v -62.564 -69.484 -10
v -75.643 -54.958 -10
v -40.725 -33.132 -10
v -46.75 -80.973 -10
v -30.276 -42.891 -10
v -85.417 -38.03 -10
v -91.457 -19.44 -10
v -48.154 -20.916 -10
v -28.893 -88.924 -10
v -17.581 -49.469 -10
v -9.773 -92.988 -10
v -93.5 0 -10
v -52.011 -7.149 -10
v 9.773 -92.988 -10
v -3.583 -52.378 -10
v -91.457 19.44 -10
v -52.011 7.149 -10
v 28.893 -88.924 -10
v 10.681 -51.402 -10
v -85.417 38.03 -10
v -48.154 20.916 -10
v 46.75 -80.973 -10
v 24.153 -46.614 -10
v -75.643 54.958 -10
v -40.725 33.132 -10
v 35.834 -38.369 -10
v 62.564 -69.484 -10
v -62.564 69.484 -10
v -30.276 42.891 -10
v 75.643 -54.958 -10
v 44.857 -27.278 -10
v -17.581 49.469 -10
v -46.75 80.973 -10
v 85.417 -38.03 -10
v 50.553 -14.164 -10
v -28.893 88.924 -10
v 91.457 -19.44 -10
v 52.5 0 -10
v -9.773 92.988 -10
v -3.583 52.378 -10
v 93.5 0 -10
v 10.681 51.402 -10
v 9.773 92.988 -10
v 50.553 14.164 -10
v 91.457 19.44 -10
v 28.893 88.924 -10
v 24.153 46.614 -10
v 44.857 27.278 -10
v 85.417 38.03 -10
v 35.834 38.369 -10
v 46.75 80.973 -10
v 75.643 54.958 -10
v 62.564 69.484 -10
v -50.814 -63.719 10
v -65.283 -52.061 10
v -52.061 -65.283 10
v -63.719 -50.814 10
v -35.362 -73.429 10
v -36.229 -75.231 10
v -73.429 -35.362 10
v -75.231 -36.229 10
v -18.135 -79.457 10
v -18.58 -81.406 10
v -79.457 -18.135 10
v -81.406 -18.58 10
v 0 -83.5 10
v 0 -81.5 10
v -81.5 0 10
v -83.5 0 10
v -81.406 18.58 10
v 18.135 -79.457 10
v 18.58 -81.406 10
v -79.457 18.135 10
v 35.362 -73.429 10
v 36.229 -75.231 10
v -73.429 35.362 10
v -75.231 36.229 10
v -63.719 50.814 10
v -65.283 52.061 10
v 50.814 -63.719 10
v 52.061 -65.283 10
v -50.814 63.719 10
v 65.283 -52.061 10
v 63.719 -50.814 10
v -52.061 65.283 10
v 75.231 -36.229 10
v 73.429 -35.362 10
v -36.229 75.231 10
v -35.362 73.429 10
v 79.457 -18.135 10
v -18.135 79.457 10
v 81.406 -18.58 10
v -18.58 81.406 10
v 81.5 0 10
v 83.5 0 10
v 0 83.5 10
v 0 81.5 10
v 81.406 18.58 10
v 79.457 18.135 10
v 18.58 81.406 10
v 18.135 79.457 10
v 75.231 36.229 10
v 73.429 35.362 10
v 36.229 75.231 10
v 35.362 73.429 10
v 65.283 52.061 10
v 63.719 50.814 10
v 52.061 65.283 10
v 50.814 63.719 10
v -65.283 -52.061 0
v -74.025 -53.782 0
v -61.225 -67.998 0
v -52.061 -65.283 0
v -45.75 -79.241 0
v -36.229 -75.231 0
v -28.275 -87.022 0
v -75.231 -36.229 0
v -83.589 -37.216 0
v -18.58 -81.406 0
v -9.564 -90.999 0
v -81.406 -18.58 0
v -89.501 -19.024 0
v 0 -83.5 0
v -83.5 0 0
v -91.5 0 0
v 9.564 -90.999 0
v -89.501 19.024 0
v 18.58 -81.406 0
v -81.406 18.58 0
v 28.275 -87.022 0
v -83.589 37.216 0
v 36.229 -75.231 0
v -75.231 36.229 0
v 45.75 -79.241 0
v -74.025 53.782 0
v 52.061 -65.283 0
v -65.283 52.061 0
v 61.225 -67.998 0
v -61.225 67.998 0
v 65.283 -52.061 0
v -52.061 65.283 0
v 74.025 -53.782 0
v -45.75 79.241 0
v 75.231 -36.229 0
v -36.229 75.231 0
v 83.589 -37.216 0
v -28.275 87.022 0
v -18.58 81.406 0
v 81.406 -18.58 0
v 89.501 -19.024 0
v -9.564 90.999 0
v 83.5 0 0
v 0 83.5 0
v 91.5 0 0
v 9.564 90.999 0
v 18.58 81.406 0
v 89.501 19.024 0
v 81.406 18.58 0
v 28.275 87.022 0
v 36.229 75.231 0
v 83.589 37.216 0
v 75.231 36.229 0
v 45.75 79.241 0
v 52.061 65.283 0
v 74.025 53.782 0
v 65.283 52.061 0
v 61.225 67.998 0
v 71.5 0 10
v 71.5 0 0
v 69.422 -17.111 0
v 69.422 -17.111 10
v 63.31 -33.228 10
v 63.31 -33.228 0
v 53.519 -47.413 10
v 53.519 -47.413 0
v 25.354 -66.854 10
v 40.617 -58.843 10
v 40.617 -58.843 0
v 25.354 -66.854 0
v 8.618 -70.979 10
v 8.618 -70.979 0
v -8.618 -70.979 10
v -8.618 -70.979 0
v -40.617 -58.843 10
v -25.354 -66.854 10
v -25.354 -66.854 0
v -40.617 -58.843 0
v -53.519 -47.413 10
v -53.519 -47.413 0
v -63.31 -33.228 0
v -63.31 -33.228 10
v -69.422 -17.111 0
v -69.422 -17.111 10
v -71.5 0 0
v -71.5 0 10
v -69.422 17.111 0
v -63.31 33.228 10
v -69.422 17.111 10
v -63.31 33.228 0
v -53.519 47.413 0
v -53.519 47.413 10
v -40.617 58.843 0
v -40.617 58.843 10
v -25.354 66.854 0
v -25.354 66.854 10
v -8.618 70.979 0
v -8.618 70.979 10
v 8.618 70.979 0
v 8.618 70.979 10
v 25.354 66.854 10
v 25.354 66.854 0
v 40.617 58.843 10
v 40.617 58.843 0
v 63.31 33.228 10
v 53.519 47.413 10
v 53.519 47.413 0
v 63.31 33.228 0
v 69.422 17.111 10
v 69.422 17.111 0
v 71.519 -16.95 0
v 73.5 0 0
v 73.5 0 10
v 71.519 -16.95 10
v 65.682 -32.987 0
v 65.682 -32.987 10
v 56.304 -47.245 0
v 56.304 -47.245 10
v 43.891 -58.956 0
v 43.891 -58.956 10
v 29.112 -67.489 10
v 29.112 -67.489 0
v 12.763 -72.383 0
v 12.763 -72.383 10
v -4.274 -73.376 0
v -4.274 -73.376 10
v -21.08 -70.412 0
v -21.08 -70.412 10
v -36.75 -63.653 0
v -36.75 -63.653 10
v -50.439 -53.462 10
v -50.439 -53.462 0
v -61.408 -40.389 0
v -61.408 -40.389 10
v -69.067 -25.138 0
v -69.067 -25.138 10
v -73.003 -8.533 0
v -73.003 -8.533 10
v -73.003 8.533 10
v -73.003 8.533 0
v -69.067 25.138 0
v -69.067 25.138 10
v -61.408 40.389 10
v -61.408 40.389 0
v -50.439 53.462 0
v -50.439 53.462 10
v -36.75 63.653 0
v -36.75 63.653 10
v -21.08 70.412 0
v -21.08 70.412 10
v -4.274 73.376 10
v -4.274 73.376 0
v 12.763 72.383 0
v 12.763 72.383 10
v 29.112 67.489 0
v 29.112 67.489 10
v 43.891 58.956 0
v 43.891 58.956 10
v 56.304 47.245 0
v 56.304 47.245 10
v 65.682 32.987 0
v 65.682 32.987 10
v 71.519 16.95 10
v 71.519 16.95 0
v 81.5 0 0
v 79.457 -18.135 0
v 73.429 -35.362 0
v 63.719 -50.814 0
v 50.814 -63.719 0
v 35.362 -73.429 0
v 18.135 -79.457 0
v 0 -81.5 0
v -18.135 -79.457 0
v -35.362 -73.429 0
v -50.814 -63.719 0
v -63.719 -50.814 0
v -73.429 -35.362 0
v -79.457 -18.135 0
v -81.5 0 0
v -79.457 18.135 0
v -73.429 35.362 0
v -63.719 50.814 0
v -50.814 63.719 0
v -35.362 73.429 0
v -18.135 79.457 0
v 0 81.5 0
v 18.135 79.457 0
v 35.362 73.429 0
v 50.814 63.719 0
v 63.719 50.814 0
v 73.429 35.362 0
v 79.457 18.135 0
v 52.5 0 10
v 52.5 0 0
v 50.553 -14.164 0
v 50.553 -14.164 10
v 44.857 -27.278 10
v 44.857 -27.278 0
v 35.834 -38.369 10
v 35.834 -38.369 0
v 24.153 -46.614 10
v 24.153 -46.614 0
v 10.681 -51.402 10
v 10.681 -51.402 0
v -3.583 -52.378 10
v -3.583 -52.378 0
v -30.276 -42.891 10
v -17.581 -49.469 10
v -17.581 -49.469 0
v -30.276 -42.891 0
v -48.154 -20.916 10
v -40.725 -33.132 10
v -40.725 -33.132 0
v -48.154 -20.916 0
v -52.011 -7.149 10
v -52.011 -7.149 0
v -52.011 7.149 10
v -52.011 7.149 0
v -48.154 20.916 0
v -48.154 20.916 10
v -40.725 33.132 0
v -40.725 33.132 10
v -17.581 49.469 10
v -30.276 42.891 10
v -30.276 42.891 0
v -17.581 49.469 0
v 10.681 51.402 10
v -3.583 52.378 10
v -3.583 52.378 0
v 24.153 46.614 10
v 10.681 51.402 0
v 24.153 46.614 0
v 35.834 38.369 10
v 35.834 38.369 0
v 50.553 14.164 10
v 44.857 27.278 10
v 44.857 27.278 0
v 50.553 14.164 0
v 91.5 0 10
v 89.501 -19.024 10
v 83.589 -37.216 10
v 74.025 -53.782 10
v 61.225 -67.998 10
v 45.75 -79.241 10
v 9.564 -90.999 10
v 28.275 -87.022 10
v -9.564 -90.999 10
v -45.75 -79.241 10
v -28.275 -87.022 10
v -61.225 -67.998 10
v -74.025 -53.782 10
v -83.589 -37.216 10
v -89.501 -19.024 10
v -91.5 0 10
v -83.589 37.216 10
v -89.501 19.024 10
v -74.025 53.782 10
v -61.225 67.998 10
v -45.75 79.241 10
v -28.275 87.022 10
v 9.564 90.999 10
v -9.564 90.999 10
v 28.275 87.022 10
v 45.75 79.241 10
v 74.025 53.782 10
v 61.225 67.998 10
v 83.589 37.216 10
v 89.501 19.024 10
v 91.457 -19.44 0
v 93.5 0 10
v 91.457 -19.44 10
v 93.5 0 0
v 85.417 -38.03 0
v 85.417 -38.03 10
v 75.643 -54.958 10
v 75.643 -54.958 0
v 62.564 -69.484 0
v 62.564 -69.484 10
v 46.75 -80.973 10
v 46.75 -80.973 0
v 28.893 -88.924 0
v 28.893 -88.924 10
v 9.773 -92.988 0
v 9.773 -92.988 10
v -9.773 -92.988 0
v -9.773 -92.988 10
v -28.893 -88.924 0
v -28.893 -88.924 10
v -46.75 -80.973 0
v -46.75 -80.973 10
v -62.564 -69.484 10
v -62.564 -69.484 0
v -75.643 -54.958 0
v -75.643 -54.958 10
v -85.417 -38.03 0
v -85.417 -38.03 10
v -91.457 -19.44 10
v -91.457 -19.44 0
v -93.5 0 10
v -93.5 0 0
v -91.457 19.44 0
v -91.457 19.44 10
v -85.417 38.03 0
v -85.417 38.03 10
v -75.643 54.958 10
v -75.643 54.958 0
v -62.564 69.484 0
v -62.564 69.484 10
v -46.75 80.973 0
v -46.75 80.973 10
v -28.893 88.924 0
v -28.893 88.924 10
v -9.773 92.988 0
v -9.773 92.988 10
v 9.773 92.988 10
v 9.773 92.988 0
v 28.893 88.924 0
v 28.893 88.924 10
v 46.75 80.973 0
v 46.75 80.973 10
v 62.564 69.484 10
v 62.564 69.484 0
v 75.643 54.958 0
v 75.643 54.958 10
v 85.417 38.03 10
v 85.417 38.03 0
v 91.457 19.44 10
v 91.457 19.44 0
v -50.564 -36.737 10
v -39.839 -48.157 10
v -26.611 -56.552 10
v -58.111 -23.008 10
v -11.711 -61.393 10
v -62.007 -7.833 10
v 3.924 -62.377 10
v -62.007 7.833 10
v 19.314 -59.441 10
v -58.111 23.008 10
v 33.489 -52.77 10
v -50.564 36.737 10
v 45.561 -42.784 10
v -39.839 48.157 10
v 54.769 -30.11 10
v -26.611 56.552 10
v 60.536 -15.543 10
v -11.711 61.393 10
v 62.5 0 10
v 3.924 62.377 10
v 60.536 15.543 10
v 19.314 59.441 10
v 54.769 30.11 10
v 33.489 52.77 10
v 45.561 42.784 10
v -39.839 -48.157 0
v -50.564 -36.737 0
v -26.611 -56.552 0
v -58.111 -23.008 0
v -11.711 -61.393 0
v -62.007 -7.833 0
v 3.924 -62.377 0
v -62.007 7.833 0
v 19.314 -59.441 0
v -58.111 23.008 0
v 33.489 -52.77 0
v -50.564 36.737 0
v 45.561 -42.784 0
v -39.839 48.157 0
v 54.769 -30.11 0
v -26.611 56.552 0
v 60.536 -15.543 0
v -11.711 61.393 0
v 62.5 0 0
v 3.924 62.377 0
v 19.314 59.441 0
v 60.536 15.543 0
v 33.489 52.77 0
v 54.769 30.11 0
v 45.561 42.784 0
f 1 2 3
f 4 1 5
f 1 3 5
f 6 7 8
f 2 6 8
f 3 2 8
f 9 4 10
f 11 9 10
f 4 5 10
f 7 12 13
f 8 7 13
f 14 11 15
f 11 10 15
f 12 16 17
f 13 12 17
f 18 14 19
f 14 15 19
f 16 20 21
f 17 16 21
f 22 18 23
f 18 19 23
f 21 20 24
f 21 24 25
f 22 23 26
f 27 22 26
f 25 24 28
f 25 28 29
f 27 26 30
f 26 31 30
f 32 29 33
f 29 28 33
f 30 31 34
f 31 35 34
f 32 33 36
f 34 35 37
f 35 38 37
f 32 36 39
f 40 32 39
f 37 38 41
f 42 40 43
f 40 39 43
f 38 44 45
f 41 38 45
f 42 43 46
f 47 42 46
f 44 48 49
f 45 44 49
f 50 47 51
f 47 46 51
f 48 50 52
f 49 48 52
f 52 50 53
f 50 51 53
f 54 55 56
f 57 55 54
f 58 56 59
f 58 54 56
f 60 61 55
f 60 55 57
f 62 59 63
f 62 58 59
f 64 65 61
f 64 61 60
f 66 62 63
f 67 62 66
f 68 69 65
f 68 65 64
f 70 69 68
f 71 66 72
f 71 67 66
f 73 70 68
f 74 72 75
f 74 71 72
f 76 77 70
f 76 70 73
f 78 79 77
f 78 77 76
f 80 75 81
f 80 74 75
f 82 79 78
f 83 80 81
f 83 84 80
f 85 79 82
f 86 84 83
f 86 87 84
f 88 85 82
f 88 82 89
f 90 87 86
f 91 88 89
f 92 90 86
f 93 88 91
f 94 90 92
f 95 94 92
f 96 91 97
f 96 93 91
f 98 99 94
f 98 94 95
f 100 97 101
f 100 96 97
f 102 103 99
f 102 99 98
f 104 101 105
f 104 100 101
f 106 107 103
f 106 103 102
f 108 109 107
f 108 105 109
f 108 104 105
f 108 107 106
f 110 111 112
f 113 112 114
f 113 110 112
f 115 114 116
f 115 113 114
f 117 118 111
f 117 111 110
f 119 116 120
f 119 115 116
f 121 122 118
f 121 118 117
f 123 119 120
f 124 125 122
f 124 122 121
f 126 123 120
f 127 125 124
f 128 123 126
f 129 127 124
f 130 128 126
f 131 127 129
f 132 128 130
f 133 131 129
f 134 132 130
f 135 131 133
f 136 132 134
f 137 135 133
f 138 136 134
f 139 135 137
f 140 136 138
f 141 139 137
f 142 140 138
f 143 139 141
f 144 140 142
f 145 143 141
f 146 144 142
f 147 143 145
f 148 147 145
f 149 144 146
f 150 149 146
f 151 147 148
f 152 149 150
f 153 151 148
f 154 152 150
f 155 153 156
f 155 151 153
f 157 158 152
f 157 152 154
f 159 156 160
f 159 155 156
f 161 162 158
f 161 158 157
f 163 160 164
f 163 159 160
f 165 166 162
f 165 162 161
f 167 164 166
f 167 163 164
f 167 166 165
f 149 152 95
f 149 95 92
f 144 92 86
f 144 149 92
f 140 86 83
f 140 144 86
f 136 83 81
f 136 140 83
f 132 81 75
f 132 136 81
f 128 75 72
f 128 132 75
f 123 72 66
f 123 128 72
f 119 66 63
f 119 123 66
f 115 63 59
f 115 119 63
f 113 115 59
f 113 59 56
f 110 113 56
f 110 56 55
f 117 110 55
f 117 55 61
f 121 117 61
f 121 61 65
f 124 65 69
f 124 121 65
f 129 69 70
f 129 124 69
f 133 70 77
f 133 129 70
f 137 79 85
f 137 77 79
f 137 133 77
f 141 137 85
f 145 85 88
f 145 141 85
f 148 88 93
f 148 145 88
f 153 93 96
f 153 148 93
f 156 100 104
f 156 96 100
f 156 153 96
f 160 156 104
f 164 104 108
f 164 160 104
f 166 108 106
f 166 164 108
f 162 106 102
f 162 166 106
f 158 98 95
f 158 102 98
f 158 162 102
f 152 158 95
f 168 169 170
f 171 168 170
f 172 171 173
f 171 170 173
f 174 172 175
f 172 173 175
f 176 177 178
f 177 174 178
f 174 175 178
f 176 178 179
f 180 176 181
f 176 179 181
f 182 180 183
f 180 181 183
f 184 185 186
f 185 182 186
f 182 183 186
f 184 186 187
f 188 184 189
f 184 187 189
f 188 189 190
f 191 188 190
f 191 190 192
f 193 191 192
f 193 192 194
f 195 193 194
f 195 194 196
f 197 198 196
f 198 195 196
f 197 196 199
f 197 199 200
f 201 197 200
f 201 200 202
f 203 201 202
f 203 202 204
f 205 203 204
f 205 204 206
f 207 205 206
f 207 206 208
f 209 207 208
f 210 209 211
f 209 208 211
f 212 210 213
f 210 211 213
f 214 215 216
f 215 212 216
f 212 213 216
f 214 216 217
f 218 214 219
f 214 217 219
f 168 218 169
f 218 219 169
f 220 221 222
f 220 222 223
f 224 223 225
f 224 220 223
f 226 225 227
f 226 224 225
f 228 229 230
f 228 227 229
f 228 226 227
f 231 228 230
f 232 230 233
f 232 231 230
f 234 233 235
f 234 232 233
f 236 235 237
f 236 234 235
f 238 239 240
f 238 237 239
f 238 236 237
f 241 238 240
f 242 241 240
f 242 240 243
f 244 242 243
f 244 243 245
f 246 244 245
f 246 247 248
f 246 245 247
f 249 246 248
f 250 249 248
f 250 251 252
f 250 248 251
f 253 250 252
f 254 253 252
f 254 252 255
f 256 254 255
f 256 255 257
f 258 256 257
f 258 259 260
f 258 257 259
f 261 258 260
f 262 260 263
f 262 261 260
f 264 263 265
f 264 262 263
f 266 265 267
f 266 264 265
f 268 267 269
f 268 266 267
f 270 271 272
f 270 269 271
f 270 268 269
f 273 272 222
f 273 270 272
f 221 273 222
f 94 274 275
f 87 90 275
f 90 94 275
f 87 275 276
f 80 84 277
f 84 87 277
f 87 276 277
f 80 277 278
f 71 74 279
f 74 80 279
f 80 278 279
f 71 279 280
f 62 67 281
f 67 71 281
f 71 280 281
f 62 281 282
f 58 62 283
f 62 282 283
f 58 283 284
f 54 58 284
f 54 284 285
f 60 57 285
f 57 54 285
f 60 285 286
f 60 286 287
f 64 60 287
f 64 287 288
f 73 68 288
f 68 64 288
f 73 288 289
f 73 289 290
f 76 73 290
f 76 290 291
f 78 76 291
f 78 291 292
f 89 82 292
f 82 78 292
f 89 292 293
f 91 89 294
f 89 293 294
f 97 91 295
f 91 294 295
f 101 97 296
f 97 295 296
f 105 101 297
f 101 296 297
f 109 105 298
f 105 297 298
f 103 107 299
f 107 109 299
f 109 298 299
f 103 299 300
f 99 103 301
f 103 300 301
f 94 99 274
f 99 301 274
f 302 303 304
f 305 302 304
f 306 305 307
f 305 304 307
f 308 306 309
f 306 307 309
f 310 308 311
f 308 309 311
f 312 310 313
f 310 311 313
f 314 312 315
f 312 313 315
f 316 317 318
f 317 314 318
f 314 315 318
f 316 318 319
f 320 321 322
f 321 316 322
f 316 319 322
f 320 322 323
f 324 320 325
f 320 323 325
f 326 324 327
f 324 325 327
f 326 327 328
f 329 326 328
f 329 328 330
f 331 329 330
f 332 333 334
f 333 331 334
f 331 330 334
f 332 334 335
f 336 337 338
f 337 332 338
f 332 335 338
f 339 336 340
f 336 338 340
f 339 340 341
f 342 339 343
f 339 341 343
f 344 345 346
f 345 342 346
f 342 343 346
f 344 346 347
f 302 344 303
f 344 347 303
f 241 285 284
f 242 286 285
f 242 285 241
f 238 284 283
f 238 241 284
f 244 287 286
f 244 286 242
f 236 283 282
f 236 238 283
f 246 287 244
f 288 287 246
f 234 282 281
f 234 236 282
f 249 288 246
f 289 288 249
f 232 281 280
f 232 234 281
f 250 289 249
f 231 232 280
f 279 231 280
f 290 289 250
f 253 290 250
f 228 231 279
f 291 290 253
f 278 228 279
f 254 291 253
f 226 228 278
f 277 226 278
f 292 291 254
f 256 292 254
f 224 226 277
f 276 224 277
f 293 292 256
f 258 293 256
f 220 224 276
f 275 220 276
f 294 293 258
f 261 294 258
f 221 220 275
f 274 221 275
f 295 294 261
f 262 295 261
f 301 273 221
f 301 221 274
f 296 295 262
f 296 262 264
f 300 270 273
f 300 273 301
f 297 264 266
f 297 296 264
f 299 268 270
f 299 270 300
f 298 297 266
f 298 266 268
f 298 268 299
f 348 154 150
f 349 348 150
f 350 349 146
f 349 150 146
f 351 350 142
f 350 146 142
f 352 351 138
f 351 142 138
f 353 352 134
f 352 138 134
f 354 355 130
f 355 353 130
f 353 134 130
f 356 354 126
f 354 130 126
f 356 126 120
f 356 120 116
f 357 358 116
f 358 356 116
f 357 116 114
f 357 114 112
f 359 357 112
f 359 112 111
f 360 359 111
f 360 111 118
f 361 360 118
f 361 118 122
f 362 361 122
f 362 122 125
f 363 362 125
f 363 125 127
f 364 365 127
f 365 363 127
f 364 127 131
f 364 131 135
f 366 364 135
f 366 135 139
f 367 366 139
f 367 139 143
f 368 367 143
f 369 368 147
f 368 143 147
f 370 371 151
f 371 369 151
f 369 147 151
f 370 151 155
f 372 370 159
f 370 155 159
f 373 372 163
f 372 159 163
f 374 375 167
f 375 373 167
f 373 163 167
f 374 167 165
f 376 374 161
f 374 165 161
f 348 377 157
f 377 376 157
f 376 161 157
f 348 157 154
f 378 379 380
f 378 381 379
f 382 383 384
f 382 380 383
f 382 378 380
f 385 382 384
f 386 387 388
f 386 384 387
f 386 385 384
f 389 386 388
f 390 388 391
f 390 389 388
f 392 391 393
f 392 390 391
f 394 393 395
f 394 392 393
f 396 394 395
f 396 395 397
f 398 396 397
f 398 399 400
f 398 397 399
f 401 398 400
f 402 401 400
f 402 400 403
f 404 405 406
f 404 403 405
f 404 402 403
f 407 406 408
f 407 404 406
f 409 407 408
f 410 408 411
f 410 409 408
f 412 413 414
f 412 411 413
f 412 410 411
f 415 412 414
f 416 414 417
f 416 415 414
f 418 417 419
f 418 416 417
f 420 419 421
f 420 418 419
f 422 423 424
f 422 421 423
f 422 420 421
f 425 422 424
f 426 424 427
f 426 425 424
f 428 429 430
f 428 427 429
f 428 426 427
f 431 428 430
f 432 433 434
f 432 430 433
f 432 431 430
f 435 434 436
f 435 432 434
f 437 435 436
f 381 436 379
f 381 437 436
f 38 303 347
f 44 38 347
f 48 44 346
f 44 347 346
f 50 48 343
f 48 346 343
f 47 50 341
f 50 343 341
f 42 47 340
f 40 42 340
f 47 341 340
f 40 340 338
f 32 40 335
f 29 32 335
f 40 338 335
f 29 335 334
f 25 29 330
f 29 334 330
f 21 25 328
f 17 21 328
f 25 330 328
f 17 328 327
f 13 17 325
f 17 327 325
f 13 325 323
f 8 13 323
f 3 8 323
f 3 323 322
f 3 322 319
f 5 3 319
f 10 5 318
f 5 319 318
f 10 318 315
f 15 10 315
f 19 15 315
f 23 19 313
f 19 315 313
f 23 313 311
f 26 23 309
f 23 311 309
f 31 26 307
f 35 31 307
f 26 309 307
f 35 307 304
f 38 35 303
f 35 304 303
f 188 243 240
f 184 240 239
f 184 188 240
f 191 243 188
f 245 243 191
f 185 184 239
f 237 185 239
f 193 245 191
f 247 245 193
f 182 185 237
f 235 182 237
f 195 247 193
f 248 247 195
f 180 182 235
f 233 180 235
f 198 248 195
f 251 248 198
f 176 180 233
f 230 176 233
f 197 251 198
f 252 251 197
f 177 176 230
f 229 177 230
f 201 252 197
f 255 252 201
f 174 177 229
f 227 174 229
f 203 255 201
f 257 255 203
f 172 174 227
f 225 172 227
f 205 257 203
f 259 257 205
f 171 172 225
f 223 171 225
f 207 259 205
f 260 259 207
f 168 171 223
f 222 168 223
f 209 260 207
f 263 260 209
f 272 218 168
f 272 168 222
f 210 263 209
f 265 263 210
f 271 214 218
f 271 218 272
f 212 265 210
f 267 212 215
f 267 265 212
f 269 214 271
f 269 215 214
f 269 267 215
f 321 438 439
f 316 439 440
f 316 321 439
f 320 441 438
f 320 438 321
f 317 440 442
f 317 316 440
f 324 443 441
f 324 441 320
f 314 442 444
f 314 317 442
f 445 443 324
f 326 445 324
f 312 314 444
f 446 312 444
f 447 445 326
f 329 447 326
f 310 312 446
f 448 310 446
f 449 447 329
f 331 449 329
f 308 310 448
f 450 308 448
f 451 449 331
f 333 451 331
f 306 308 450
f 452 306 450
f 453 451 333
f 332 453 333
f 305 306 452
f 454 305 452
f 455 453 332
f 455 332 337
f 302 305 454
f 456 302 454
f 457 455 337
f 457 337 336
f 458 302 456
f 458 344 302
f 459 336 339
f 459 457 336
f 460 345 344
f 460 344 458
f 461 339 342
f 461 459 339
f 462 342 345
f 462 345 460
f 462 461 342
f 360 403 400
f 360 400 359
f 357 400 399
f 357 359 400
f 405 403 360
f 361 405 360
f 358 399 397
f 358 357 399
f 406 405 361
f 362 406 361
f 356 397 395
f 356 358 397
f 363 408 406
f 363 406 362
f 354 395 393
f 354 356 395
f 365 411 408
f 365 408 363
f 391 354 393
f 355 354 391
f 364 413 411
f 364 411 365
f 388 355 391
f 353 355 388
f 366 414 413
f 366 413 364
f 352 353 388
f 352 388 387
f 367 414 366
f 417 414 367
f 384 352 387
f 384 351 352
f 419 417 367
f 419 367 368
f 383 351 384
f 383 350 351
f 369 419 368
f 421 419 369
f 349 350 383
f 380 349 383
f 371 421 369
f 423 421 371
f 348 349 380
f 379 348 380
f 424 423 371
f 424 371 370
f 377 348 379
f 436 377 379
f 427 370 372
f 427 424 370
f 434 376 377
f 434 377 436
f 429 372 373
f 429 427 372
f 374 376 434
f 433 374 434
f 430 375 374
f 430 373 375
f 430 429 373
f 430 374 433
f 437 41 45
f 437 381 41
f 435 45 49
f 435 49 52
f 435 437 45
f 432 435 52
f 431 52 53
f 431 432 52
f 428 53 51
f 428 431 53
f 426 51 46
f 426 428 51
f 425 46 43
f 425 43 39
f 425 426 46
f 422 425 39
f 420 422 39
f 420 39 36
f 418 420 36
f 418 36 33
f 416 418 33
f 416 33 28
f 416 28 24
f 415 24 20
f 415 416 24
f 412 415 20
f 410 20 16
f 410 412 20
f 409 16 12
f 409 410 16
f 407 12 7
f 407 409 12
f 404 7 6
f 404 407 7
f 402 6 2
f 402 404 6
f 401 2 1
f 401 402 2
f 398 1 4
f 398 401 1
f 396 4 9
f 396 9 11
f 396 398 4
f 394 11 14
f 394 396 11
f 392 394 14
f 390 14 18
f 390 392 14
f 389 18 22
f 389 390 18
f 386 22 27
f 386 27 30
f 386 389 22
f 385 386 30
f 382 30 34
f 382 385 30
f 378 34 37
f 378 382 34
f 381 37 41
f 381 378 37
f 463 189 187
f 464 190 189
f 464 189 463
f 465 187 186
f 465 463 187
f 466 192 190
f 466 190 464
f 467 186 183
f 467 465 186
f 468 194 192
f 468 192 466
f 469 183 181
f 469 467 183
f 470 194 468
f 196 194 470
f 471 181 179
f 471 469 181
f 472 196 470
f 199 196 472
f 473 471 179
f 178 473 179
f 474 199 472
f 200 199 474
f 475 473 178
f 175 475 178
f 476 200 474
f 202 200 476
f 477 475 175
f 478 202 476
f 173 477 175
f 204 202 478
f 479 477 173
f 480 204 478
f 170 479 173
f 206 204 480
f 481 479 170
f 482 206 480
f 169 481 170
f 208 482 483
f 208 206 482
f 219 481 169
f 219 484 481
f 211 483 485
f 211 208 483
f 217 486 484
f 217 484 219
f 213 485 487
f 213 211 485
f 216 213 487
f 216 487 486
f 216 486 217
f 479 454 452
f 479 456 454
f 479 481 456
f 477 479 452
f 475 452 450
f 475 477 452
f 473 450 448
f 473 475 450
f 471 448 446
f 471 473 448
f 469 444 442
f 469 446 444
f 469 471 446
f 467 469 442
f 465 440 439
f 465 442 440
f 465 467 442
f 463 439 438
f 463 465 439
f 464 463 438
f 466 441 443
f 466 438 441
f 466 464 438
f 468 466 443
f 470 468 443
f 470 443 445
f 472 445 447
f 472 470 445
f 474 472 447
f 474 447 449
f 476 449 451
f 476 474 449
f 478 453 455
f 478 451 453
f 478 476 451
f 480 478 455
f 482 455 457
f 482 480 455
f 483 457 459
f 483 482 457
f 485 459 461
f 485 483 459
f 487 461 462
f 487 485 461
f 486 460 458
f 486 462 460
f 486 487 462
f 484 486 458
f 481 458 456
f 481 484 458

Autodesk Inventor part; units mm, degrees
ref_plane "YZ Plane" through (0, 0, 0) normal (1, 0, 0) x (0, 1, 0)
ref_plane "XZ Plane" through (0, 0, 0) normal (0, 1, 0) x (-1, 0, 0)
sketch "Sketch1" plane through (0, 0, 0) normal (0, 0, 1) x (1, 0, 0)
  circle A0 centre (0, 0) radius 71.5
  circle A1 centre (0, 0) radius 73.5
  circle A2 centre (0, 0) radius 81.5
  circle A3 centre (0, 0) radius 83.5
  circle A4 centre (0, 0) radius 91.5
  circle A5 centre (0, 0) radius 93.5
  circle A6 centre (0, 0) radius 52.5
  circle A7 centre (0, 0) radius 62.5
  dimension "d0" = 143
  dimension "d1" = 147
  dimension "d2" = 163
  dimension "d3" = 167
  dimension "d4" = 183
  dimension "d5" = 187
  dimension "d6" = 105
  dimension "d7" = 125
extrude "Extrusion1" add sketch "Sketch1" along normal blind 10
extrude "Extrusion2" add sketch "Sketch1" against normal blind 10 contours A0 | A1 | A2 | A3 | A4 | A5 | A6 | A7
extrude "Extrusion3" cut sketch "Sketch1" against normal blind 10 contours A6
ref_plane "Work Plane4" through (0, 0, -5) normal (0, 0, 1) x (1, 0, 0)
ref_plane "Work Plane3" through (0, 0, 0) normal (0, 0, 1) x (1, 0, 0)
sketch "Sketch3" plane through (0, 0, 10) normal (0, 0, 1) x (1, 0, 0)
  circle A0 centre (0, 0) radius 61
  dimension "d18" = 122
sketch "Sketch4" plane through (0, 0, 5) normal (0, 0, 1) x (1, 0, 0)
  circle A0 centre (0, 0) radius 61
  dimension "d19" = 122
sketch "Sketch5" plane through (0, 0, 0) normal (0, 0, 1) x (1, 0, 0)
  circle A0 centre (0, 0) radius 61
  dimension "d20" = 122
ref_plane "Work Plane1" through (0, 0, 10) normal (0, 0, 1) x (1, 0, 0)
ref_plane "Work Plane2" through (0, 0, 5) normal (0, 0, 1) x (1, 0, 0)
properties part number "labyrinth"
